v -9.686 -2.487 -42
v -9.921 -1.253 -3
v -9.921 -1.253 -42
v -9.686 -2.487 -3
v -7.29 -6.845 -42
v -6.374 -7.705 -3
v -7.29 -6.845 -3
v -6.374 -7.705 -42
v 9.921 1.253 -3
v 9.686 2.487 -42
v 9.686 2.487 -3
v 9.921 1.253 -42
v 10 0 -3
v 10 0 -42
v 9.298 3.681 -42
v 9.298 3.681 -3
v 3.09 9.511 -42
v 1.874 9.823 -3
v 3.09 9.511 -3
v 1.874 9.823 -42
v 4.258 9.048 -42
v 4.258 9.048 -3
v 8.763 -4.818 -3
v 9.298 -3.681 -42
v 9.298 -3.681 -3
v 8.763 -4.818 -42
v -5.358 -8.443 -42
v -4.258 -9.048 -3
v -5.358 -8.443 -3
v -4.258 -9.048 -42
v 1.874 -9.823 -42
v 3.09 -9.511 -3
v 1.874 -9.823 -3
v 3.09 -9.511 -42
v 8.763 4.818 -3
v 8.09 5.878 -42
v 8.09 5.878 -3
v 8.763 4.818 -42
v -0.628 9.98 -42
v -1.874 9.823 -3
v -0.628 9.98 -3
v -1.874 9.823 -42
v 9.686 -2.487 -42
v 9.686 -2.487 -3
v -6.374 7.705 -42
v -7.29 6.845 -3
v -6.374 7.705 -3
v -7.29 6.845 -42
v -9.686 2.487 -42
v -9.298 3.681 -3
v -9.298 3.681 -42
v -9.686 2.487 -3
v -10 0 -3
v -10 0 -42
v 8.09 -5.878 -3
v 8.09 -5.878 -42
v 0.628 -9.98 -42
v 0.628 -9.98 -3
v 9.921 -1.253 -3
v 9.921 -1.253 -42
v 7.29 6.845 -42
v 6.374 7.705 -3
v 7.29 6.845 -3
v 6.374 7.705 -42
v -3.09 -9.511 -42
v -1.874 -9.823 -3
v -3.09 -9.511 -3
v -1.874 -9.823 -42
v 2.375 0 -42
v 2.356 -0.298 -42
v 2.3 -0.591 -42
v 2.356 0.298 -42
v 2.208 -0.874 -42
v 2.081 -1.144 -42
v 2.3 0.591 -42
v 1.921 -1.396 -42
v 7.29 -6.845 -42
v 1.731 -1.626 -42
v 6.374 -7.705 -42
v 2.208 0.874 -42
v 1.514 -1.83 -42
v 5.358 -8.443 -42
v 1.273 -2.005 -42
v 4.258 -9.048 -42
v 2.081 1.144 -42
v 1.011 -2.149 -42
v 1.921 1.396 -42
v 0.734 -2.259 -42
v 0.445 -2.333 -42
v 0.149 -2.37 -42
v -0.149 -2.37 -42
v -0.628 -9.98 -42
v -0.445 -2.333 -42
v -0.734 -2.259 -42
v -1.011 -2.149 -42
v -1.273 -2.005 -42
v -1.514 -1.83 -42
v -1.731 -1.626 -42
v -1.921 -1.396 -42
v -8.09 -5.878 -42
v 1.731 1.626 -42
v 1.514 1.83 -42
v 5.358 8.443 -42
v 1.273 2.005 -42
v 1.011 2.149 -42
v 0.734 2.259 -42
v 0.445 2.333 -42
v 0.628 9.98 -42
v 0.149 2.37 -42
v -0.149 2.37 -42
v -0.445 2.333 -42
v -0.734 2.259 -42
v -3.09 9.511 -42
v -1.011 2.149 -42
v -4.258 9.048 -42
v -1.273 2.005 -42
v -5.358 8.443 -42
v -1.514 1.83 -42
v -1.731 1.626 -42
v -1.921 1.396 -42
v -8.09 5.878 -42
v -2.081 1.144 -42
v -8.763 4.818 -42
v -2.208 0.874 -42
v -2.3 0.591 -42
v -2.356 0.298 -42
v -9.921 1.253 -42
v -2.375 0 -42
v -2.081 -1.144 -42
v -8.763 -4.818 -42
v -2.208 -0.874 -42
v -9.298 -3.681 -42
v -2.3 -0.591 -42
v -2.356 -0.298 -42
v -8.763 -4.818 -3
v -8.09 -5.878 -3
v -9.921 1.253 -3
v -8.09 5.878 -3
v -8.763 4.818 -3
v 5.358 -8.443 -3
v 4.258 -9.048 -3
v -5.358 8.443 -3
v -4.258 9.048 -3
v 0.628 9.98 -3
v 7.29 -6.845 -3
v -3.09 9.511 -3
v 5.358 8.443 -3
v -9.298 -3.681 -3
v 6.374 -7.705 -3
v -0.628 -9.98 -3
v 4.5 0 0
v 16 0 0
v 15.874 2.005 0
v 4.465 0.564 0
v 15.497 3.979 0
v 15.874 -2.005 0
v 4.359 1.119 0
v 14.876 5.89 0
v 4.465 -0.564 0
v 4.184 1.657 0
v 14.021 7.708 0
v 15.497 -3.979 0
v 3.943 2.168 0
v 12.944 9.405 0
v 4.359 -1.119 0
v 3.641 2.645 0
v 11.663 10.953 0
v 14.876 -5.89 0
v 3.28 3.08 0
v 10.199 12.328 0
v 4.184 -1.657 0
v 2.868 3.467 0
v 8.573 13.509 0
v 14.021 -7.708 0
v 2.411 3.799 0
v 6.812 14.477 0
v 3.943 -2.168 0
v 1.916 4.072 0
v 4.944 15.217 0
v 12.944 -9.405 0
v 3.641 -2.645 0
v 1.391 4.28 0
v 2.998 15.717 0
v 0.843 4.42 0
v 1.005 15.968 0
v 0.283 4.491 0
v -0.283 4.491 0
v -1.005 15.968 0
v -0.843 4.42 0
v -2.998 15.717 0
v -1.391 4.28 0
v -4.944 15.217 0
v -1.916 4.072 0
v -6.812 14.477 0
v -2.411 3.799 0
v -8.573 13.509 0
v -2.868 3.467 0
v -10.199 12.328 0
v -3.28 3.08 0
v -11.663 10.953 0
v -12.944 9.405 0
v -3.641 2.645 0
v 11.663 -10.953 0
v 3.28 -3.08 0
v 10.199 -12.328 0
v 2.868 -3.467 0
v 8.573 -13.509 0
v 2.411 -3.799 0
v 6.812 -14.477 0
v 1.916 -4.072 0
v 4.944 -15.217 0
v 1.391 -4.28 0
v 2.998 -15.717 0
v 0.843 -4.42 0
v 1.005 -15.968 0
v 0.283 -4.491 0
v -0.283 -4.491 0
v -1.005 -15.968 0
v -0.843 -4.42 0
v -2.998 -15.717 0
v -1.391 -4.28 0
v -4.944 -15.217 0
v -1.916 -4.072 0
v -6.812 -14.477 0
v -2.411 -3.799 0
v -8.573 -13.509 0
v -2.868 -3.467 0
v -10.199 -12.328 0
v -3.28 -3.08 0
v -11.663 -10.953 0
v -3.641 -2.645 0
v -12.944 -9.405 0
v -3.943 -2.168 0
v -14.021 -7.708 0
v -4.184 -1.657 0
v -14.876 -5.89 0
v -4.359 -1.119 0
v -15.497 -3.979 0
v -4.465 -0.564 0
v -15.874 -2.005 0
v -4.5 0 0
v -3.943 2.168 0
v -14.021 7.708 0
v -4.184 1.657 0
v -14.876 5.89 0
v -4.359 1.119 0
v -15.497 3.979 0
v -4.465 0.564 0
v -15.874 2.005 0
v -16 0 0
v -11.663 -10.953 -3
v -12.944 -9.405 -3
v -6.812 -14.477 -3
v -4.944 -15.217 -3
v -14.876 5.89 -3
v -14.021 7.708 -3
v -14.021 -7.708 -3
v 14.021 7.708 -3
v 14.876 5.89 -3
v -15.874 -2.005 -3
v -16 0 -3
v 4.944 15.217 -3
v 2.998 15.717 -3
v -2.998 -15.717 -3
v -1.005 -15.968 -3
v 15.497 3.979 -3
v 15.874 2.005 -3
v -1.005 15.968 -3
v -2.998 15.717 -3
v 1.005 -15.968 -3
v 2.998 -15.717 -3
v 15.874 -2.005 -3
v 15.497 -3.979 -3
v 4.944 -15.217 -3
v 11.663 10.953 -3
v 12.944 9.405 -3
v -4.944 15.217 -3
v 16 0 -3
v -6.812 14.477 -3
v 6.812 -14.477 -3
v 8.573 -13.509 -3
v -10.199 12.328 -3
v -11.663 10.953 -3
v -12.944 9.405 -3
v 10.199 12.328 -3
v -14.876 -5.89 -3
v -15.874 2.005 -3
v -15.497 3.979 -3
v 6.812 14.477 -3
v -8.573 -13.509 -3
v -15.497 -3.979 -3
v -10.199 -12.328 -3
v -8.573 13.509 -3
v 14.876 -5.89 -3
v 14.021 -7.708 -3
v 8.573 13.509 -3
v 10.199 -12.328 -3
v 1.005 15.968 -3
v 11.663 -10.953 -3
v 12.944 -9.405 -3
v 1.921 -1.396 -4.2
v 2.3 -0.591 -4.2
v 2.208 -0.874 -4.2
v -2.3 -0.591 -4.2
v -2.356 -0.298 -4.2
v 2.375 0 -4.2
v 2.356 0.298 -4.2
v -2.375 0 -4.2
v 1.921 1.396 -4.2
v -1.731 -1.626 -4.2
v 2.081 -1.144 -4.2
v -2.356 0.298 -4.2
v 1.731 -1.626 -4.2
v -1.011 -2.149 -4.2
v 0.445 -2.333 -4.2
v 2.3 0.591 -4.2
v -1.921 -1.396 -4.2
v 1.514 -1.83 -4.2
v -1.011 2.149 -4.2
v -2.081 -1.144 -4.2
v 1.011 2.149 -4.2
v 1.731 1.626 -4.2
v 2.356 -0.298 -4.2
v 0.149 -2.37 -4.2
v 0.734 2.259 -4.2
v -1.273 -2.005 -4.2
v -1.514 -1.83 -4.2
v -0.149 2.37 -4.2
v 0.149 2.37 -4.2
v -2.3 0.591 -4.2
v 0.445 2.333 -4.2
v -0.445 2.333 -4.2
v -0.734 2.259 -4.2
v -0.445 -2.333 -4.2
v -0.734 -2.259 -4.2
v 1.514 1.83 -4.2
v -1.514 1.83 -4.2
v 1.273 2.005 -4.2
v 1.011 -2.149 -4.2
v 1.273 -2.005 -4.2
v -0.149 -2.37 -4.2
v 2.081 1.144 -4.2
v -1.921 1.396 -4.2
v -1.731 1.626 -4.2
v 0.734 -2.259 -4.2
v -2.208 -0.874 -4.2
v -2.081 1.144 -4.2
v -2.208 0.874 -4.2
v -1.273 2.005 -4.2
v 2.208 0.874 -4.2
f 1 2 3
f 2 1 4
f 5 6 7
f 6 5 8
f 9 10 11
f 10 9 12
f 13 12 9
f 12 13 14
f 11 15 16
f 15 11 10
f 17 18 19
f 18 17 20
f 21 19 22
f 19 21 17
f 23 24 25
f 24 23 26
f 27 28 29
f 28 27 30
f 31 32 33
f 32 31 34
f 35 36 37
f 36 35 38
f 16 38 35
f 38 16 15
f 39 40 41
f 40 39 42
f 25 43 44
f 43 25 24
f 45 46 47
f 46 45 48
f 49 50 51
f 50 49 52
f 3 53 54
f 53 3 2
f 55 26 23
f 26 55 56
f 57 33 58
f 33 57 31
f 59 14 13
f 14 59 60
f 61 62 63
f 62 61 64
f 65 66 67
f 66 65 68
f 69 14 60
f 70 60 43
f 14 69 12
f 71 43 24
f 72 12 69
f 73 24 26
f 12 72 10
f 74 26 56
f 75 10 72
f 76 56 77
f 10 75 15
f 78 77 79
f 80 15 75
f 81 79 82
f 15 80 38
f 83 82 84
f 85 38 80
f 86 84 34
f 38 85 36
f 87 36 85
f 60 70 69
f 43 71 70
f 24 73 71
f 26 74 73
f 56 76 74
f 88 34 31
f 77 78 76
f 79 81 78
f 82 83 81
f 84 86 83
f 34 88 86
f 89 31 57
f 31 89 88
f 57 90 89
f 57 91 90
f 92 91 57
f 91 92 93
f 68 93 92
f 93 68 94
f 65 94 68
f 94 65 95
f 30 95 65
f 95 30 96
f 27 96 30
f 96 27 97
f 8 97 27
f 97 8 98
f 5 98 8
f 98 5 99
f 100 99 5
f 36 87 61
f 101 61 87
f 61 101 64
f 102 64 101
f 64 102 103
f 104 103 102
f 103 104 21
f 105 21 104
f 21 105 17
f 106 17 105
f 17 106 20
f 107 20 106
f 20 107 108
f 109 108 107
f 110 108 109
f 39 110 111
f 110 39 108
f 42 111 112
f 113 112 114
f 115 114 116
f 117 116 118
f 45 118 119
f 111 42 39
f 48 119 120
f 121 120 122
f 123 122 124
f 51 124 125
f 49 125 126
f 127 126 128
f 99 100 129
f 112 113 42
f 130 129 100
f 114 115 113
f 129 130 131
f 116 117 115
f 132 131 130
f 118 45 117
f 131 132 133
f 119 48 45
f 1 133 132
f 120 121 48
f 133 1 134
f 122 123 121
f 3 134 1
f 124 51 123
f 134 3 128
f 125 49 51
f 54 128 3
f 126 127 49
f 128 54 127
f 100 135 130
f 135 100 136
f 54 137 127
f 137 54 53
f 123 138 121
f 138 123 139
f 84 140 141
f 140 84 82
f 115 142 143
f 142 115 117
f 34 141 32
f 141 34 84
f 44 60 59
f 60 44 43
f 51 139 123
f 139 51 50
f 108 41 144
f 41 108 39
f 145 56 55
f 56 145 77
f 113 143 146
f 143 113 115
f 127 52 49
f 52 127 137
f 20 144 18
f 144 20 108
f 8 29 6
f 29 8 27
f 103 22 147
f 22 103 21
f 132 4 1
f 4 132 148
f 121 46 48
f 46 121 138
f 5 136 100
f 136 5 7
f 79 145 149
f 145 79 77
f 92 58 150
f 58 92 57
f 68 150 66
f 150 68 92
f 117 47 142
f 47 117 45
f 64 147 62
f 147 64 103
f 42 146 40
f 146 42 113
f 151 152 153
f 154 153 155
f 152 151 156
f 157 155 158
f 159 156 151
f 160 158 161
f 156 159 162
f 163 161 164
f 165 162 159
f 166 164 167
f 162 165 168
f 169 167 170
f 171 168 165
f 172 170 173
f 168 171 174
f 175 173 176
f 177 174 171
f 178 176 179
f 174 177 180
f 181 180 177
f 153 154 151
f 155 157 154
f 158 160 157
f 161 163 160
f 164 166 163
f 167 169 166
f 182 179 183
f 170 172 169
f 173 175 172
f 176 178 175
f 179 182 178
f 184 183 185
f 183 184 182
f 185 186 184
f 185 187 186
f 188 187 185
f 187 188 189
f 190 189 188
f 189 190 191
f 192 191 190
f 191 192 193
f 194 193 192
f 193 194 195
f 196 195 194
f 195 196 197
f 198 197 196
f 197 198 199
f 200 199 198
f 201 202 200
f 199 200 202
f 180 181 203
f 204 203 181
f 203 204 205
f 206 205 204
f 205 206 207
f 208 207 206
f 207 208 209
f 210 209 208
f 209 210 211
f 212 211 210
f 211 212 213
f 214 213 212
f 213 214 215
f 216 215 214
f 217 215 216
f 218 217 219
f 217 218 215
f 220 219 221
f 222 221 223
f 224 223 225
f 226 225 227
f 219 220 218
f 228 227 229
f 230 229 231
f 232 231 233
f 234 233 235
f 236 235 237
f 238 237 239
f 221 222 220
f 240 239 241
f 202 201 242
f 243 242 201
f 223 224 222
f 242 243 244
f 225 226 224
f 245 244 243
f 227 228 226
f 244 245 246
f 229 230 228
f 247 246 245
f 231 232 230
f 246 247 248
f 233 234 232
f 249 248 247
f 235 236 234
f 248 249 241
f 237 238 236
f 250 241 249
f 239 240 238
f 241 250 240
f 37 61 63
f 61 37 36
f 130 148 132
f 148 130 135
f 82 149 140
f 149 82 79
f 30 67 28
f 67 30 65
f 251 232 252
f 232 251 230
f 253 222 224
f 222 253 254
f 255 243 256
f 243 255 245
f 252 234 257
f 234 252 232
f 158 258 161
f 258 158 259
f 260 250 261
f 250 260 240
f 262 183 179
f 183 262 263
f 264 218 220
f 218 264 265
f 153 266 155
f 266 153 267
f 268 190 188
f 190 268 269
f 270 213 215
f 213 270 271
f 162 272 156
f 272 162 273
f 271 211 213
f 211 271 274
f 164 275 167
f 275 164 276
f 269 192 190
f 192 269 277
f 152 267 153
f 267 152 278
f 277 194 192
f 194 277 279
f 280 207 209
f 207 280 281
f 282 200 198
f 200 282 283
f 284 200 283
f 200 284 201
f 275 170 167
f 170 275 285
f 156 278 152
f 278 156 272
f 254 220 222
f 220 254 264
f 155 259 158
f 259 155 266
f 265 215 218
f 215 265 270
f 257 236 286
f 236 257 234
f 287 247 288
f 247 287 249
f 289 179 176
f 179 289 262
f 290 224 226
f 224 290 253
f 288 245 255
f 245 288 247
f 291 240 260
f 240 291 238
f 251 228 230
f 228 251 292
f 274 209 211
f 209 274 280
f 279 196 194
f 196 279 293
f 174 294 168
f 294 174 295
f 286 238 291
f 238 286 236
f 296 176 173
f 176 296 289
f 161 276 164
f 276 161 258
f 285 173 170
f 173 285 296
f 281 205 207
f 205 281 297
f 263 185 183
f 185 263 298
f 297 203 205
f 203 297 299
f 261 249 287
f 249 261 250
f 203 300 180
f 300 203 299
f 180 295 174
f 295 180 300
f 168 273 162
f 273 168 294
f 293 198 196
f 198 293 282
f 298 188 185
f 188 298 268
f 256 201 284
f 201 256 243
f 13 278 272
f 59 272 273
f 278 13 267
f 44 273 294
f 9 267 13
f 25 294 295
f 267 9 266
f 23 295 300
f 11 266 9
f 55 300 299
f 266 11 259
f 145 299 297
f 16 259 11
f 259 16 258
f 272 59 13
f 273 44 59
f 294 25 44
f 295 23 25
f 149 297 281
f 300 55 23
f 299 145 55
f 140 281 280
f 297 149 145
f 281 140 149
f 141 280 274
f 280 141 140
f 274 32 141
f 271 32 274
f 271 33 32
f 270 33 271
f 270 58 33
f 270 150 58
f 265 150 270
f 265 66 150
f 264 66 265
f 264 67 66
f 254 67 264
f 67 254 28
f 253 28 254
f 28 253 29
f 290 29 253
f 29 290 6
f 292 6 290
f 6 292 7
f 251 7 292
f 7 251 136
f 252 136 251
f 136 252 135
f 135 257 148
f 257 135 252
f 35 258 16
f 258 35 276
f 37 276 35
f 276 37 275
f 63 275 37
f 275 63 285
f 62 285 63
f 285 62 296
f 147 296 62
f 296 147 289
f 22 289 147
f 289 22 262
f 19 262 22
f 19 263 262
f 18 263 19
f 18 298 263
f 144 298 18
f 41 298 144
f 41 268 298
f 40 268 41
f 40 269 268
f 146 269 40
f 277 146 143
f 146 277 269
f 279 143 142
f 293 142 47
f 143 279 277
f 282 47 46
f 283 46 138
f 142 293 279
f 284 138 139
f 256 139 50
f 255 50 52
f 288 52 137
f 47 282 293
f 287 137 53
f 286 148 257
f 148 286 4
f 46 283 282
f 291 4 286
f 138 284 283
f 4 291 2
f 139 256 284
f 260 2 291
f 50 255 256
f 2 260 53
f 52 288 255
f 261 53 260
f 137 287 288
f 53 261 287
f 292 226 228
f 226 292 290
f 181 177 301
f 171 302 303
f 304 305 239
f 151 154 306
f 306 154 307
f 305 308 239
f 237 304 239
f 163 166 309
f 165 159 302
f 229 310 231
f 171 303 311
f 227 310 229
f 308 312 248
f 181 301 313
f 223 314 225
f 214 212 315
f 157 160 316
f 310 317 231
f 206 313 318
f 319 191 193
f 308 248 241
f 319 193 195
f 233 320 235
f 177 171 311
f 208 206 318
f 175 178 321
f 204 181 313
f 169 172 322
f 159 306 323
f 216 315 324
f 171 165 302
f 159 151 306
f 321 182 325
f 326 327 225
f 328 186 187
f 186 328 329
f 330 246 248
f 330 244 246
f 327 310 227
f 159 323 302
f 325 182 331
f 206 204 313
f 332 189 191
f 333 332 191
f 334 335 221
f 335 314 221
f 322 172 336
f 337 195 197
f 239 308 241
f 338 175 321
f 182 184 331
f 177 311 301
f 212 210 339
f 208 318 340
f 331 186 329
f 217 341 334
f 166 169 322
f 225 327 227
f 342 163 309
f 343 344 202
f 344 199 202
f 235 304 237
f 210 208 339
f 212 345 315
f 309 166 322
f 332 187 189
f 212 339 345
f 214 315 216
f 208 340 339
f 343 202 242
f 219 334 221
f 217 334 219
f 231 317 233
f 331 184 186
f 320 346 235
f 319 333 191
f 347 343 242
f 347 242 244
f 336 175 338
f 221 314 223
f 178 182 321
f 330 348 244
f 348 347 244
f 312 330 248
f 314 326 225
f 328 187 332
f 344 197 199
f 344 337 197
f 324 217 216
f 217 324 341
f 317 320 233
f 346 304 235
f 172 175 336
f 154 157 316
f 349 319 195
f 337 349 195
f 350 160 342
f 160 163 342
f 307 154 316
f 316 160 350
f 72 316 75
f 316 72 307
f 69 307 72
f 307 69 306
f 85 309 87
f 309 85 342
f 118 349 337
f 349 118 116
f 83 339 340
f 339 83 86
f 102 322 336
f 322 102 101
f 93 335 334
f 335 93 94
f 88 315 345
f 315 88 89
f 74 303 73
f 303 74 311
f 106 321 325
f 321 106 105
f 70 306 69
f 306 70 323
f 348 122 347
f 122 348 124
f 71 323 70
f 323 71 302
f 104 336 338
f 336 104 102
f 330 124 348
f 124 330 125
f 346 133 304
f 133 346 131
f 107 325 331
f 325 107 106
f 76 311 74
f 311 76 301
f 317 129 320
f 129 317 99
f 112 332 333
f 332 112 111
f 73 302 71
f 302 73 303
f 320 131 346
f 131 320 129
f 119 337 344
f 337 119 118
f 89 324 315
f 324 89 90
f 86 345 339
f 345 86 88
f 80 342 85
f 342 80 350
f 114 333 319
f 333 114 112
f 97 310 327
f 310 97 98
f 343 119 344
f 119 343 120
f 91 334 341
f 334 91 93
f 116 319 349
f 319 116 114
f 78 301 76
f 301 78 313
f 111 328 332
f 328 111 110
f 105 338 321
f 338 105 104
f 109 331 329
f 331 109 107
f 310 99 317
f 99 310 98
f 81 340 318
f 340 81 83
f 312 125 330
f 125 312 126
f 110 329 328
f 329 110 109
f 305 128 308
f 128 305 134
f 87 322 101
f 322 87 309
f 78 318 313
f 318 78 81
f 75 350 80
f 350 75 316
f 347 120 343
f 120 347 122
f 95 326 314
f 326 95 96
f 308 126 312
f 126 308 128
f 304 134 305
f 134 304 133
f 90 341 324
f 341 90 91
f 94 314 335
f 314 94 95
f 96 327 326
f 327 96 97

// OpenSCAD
$fn = 50;


difference() {
	union() {
		translate(v = [0, 0, -42.0000000000]) {
			cylinder(h = 42, r = 10.0000000000);
		}
		translate(v = [0, 0, -3.0000000000]) {
			cylinder(h = 3, r = 16.0000000000);
		}
	}
	union() {
		translate(v = [0, 0, 0]) {
			rotate(a = [0, 0, 0]) {
				difference() {
					union() {
						#translate(v = [0, 0, -42.0000000000]) {
							cylinder(h = 42, r = 2.2500000000);
						}
						#translate(v = [0, 0, -4.2000000000]) {
							cylinder(h = 4.2000000000, r = 10.0000000000, r1 = 2.3750000000, r2 = 4.5000000000);
						}
						#translate(v = [0, 0, -42.0000000000]) {
							cylinder(h = 42, r = 2.3750000000);
						}
						#translate(v = [0, 0, -42.0000000000]) {
							cylinder(h = 42, r = 2.2500000000);
						}
					}
					union();
				}
			}
		}
	}
}
